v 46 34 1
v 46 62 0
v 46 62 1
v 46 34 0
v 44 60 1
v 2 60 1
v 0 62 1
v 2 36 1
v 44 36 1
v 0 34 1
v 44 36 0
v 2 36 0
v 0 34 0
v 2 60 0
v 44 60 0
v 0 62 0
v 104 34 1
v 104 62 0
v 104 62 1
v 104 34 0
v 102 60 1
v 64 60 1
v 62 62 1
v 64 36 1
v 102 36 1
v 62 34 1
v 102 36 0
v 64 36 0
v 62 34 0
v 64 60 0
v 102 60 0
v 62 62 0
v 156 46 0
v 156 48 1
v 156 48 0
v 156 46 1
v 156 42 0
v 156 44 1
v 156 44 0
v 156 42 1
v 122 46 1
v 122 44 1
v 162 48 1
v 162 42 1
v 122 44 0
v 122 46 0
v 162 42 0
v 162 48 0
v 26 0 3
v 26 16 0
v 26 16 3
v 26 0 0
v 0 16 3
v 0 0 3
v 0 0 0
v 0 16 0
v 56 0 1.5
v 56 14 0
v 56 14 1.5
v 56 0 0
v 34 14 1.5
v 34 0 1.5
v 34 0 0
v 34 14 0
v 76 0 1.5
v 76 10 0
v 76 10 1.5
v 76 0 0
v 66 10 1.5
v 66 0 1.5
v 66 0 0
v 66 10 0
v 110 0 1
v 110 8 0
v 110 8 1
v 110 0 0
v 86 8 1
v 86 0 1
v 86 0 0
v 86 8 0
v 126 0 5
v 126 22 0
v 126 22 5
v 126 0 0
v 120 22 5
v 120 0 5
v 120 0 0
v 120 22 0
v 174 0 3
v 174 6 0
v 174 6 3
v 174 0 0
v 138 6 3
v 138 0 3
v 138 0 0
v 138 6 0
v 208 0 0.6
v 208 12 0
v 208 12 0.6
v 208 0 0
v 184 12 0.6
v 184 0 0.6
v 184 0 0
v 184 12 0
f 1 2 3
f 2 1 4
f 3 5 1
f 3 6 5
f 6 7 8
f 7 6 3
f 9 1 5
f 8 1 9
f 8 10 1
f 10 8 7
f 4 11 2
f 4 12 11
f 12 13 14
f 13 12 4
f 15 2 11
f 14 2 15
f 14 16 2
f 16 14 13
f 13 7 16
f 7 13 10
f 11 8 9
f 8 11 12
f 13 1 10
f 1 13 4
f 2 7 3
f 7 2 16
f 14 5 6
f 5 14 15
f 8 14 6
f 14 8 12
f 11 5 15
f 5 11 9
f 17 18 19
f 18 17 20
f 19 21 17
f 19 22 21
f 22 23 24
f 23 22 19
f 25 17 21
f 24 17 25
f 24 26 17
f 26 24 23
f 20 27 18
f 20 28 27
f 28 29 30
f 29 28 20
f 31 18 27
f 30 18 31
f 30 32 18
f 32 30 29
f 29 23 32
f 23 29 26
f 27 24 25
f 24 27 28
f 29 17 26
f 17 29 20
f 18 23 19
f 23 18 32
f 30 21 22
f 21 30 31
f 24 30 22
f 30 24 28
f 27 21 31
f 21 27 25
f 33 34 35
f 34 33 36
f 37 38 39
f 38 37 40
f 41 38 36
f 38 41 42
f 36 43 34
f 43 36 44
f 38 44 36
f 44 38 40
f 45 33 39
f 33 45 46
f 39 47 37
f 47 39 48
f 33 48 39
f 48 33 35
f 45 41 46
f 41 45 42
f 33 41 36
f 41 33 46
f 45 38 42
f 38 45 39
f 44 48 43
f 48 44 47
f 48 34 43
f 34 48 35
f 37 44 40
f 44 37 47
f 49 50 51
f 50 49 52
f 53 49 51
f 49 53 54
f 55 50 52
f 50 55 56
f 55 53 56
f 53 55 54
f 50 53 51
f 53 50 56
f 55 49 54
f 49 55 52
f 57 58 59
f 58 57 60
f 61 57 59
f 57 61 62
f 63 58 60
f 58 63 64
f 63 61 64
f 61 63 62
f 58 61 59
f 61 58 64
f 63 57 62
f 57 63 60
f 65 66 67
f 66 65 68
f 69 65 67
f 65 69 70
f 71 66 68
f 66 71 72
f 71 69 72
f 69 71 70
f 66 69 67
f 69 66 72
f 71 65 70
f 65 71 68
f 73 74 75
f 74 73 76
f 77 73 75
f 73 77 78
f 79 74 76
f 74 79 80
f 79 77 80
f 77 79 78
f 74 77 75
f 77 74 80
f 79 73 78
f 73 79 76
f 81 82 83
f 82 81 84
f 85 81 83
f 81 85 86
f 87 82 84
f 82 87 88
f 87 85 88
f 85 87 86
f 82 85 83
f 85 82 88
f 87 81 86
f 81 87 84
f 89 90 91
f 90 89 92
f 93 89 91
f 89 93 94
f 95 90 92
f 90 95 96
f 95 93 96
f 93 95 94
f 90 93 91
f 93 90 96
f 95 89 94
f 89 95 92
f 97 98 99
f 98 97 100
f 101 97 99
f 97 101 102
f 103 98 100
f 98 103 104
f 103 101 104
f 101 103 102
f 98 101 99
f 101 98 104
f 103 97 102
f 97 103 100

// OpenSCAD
// file: proxy_blocks.scad
/*
  Manual proxy block language

  This is a manual-diagram proxy language for assembly-guide illustrations.
  It intentionally avoids realistic geometry and exact simplified copies of
  the real mechanism. The goal is to give Codex a constrained set of named
  rectangular primitives for assembling consistent LEGO-like proxy diagrams.

  Future functional colors will be assigned later in the manual/design system.
  For now these modules use the default OpenSCAD material/color.

  Proxy parts must still align and fit in simplified 2.5D coordinates.
*/

proxy_eps = 0.02;
proxy_base_t = 3.0;
proxy_relief_h = 1.5;
proxy_detail_h = 0.6;
proxy_fin_h = 5.0;
proxy_edge_t = 2.0;

module proxy_plate(x, y, w, h, t=2) {
  translate([x, y, 0]) cube([w, h, t]);
}

module proxy_block(x, y, w, h, z=0, ht=2) {
  translate([x, y, z]) cube([w, h, ht]);
}

// Cutter volume for use inside difference(); this is not visible geometry.
module proxy_cutout(x, y, w, h, z=-0.05, ht=100) {
  translate([x, y, z]) cube([w, h, ht]);
}

module proxy_nub(x, y, w, h, z=0, ht=2) {
  proxy_block(x, y, w, h, z, ht);
}

module proxy_ledge(x, y, w, h, z=0, ht=1) {
  proxy_block(x, y, w, h, z, ht);
}

module proxy_fin(x, y, w, h, z=0, ht=5) {
  proxy_block(x, y, w, h, z, ht);
}

module proxy_rail(x, y, w, h, z=0, ht=3) {
  proxy_block(x, y, w, h, z, ht);
}

module proxy_detail(x, y, w, h, z=0, ht=0.6) {
  proxy_block(x, y, w, h, z, ht);
}

module proxy_outer_frame(panel_w, panel_h, edge_t=2, z=2, ht=1) {
  proxy_block(0, 0, panel_w, edge_t, z, ht);
  proxy_block(0, panel_h - edge_t, panel_w, edge_t, z, ht);
  proxy_block(0, edge_t, edge_t, panel_h - 2 * edge_t, z, ht);
  proxy_block(panel_w - edge_t, edge_t, edge_t, panel_h - 2 * edge_t, z, ht);
}

module proxy_rect_frame(x, y, w, h, t=1.5, z=2, ht=0.8) {
  proxy_block(x, y, w, t, z, ht);
  proxy_block(x, y + h - t, w, t, z, ht);
  proxy_block(x, y + t, t, h - 2 * t, z, ht);
  proxy_block(x + w - t, y + t, t, h - 2 * t, z, ht);
}

// Ghost-position placeholder. Later rendering may make this transparent/dashed.
module proxy_ghost_block(x, y, w, h, z=0, ht=1) {
  proxy_block(x, y, w, h, z, ht);
}

module proxy_arrow_stub(x, y, len, dir="right", z=0, ht=1) {
  shaft = max(len - 6, 2);
  if (dir == "right") {
    proxy_block(x, y + 2, shaft, 2, z, ht);
    proxy_block(x + shaft, y, 6, 6, z, ht);
  } else if (dir == "left") {
    proxy_block(x + 6, y + 2, shaft, 2, z, ht);
    proxy_block(x, y, 6, 6, z, ht);
  } else if (dir == "up") {
    proxy_block(x + 2, y, 2, shaft, z, ht);
    proxy_block(x, y + shaft, 6, 6, z, ht);
  } else if (dir == "down") {
    proxy_block(x + 2, y + 6, 2, shaft, z, ht);
    proxy_block(x, y, 6, 6, z, ht);
  } else {
    proxy_block(x, y + 2, shaft, 2, z, ht);
    proxy_block(x + shaft, y, 6, 6, z, ht);
  }
}
// main file
include <proxy_blocks.scad>

// Primitive vocabulary demo only. This does not represent the actual device.

proxy_plate(0, 0, 26, 16, proxy_base_t);
proxy_block(34, 0, 22, 14, 0, proxy_relief_h);
proxy_nub(66, 0, 10, 10, 0, proxy_relief_h);
proxy_ledge(86, 0, 24, 8, 0, 1);
proxy_fin(120, 0, 6, 22, 0, proxy_fin_h);
proxy_rail(138, 0, 36, 6, 0, 3);
proxy_detail(184, 0, 24, 12, 0, proxy_detail_h);

translate([0, 34, 0]) proxy_outer_frame(46, 28, proxy_edge_t, 0, 1);
proxy_rect_frame(62, 34, 42, 28, 2, 0, 1);
proxy_arrow_stub(122, 42, 40, "right", 0, 1);
